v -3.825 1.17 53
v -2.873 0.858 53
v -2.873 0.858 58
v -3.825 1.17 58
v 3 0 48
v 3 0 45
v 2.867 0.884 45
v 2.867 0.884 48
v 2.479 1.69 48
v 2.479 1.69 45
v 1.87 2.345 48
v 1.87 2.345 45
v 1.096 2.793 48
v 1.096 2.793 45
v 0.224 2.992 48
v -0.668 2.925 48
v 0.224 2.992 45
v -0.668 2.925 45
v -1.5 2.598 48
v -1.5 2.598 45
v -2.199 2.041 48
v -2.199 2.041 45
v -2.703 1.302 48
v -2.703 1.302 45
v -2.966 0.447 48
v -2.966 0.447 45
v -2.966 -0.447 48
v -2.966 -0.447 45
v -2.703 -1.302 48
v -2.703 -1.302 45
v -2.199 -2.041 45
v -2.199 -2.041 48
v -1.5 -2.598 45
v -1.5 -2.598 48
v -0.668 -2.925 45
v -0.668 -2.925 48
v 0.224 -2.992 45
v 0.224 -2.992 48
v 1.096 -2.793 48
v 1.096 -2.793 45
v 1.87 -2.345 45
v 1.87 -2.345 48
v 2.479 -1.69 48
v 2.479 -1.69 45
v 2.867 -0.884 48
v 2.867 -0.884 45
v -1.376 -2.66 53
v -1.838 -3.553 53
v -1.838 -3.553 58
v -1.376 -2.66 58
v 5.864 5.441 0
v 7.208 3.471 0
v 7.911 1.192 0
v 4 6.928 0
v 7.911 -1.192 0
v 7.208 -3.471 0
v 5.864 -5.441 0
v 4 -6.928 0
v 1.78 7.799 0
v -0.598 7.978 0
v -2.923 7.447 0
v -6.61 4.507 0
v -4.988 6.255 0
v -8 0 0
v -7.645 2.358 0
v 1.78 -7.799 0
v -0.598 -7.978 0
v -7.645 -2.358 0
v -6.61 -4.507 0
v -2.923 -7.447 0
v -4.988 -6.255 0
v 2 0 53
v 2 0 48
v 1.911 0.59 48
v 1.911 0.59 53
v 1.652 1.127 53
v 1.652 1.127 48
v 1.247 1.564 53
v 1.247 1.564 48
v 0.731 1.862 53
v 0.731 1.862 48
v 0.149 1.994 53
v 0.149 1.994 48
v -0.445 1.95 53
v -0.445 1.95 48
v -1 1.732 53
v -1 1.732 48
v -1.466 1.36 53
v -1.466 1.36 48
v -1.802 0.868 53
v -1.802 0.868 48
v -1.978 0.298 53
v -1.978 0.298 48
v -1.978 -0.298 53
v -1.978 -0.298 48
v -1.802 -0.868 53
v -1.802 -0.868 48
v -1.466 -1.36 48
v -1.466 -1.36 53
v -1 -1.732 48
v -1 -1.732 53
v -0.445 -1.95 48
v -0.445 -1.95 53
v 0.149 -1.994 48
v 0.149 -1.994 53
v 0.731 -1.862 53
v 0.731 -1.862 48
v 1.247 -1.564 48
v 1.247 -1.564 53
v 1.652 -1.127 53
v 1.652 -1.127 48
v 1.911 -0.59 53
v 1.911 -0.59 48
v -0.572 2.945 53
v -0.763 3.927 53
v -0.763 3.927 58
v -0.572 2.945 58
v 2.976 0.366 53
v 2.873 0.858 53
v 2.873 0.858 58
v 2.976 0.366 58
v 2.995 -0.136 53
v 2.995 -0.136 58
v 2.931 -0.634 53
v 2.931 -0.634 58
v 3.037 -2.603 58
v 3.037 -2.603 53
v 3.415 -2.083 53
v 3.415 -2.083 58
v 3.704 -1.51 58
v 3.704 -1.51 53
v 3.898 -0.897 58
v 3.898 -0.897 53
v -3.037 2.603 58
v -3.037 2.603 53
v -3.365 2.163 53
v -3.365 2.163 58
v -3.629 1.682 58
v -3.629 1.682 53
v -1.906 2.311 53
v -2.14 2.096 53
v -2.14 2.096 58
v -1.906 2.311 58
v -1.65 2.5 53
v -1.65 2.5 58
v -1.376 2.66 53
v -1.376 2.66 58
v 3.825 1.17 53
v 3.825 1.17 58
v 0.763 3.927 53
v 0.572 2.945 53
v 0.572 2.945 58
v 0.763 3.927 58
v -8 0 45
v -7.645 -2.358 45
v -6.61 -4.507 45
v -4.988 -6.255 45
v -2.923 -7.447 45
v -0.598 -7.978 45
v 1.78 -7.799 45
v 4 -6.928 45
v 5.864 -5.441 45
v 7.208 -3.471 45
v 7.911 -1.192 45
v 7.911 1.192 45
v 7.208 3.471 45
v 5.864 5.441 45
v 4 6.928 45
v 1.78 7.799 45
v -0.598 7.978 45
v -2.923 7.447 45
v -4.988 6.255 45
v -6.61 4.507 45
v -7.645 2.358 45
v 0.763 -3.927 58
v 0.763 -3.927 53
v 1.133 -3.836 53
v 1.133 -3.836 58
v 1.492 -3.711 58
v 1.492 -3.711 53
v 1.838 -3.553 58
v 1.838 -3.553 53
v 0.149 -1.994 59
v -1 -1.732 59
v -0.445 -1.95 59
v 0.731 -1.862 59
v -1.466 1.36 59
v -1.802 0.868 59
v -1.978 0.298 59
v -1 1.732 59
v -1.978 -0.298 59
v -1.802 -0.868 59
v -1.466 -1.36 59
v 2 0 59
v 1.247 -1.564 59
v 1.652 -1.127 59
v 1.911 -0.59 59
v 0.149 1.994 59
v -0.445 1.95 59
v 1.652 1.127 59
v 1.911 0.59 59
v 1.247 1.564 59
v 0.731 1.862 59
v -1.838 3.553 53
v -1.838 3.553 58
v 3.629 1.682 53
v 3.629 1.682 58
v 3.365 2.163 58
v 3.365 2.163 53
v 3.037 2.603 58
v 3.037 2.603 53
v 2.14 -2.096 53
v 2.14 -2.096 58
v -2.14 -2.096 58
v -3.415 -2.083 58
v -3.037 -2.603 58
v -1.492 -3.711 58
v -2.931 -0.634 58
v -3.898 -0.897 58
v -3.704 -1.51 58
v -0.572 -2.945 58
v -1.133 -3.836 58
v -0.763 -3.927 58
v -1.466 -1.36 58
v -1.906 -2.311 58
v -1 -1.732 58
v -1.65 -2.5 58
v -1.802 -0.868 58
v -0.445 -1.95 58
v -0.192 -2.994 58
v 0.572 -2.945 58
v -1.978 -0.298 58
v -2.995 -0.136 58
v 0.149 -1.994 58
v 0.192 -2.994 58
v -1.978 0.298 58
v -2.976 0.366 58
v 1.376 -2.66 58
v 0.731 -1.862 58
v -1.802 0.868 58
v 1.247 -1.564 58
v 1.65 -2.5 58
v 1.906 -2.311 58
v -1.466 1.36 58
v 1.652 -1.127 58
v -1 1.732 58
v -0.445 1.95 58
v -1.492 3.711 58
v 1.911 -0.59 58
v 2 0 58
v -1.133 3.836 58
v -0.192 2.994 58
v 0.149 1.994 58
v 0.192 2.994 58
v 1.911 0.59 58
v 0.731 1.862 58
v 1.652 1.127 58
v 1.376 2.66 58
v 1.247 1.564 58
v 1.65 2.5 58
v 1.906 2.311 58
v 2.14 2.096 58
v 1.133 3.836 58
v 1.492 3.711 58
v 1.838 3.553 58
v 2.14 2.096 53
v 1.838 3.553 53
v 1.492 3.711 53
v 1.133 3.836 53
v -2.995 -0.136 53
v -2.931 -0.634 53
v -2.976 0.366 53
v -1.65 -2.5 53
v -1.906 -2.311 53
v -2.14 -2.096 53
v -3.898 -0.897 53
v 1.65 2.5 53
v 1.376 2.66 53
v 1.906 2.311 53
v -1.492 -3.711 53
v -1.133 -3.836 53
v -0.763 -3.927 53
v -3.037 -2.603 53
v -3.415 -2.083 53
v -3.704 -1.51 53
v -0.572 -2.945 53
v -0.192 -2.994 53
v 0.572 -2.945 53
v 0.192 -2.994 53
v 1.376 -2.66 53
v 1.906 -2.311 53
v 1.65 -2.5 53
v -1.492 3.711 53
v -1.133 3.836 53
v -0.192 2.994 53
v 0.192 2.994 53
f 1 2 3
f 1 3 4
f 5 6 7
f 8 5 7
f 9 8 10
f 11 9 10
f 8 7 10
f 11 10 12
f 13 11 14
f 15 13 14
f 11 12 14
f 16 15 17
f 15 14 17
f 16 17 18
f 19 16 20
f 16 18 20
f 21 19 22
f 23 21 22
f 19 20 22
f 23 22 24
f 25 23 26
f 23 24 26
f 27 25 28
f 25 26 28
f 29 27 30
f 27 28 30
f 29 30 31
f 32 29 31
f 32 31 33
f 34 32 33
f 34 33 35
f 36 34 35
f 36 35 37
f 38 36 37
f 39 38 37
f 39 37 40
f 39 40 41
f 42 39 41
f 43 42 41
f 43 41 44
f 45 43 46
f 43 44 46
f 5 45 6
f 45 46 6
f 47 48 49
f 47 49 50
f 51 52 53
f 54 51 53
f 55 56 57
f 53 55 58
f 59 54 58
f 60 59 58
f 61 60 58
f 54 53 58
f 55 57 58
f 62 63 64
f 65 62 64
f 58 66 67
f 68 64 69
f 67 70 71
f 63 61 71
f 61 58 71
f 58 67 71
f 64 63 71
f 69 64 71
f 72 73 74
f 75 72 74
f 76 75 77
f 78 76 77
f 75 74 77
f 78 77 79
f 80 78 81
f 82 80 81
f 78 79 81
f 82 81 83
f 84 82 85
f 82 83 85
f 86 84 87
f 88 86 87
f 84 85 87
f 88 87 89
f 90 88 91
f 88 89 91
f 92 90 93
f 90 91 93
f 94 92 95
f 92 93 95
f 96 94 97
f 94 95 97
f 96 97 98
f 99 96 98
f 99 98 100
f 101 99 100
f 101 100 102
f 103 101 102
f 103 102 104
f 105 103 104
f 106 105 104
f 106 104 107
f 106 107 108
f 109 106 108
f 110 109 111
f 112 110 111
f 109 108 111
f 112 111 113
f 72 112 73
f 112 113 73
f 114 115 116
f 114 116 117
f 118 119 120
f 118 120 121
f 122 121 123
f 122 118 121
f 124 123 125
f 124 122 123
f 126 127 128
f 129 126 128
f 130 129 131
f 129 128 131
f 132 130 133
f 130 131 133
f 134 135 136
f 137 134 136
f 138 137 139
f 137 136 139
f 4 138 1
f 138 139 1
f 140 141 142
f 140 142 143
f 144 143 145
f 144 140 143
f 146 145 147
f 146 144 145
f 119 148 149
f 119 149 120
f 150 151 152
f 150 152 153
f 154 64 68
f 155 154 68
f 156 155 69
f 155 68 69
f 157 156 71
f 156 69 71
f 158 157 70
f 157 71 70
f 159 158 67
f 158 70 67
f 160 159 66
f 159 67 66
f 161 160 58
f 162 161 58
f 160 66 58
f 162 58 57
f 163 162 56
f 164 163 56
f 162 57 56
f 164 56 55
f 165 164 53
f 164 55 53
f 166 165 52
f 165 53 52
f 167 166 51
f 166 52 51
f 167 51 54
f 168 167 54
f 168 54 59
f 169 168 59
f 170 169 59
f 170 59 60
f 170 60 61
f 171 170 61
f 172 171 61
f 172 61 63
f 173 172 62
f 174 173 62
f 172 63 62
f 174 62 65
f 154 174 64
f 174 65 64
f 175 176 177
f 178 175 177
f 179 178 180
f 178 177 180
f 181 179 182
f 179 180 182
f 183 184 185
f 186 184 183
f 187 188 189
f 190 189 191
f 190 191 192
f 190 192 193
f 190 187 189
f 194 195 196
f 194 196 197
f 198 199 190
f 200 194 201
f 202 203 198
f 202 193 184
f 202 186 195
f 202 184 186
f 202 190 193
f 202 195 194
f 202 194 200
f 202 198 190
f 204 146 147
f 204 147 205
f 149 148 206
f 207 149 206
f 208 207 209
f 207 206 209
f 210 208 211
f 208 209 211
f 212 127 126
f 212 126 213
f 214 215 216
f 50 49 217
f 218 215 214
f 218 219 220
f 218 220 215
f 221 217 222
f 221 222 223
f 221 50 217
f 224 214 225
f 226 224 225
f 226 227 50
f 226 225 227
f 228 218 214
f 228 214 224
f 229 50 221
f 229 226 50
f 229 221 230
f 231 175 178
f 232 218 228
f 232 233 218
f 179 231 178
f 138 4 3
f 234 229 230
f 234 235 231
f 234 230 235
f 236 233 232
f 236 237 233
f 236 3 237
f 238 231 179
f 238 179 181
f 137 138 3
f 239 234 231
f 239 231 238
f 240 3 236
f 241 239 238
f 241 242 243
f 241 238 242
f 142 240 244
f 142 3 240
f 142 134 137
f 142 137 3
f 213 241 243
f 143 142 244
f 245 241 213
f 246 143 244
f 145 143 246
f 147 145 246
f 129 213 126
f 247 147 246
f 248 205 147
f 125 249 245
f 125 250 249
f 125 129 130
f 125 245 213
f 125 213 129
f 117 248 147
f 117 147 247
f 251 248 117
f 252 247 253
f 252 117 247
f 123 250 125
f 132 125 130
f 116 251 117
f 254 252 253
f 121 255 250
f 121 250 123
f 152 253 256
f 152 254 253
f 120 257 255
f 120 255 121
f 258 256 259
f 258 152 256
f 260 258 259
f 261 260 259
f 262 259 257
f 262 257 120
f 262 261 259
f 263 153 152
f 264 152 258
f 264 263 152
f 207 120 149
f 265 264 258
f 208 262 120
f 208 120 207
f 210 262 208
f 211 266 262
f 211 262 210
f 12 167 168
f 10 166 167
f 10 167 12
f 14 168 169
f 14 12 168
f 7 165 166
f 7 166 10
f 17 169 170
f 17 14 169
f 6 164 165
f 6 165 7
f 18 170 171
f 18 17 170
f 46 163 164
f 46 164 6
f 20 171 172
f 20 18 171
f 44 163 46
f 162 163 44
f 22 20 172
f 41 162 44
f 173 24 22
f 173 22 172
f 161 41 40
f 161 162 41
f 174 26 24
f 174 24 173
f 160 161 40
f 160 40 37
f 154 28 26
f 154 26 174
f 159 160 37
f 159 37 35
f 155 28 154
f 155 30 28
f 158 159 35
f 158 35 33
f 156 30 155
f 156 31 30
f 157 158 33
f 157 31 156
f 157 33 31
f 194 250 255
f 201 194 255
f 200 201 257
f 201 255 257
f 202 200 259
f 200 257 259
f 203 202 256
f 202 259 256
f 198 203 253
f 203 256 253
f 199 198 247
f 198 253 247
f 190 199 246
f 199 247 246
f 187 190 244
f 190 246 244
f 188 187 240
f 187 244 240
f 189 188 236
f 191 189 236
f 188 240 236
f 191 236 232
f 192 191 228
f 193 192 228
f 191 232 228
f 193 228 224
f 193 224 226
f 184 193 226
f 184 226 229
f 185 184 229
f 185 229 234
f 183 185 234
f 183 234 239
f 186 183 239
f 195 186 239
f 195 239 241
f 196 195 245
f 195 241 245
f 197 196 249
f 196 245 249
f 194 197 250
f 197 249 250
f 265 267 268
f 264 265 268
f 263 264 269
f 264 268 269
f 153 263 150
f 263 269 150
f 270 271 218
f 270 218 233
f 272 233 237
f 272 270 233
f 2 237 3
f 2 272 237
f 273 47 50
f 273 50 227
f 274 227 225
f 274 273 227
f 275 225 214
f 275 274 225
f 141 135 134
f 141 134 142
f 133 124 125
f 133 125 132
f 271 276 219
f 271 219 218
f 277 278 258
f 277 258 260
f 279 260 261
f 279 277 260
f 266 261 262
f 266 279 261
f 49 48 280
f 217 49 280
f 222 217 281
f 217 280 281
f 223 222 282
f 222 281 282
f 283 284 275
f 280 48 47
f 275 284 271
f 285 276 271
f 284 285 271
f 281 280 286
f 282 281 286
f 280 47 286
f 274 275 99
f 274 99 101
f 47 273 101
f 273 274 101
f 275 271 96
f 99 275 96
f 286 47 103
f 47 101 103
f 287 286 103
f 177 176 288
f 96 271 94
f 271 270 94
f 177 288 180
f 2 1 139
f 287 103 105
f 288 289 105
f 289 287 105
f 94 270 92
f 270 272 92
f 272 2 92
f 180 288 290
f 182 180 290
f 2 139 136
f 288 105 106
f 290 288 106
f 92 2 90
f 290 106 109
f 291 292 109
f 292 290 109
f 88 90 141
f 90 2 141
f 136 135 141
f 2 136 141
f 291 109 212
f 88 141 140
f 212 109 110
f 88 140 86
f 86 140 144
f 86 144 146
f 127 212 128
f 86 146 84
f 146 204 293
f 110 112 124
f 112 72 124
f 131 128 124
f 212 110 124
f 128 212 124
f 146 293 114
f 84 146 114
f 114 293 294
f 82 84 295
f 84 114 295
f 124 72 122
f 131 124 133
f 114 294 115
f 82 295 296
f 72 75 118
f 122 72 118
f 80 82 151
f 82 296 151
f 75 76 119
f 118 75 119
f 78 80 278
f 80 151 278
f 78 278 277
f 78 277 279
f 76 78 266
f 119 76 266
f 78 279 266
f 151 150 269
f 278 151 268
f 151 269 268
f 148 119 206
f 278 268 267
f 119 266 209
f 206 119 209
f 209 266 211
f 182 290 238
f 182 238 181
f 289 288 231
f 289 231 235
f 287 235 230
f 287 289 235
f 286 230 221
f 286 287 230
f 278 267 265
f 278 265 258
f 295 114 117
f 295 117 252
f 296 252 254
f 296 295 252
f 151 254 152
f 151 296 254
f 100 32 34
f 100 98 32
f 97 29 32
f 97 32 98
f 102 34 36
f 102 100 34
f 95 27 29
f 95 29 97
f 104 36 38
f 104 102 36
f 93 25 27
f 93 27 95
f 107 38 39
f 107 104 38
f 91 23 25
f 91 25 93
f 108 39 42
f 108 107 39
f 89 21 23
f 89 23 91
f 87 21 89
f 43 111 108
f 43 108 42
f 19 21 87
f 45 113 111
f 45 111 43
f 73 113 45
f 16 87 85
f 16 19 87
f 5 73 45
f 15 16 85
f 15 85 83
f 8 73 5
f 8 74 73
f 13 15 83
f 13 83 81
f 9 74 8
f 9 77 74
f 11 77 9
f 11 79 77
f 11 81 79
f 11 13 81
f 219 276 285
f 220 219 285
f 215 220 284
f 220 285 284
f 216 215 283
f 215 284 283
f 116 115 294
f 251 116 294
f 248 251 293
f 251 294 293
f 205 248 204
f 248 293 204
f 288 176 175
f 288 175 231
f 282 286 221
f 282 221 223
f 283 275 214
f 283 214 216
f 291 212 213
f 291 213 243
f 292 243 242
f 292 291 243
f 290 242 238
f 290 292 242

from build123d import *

# Parameters (mm, degrees)
ESBO_O1_R                = 8
RESSALTO_EXTRUS_O1_DEPTH = 45
ESBO_O2_R                = 3
RESSALTO_EXTRUS_O2_DEPTH = 3
ESBO_O3_R                = 2
RESSALTO_EXTRUS_O3_DEPTH = 5
ESBO_O4_R                = 4
RESSALTO_EXTRUS_O4_DEPTH = 5
ESBO_O5_R                = 2
RESSALTO_EXTRUS_O5_DEPTH = 1
CORTE_EXTRUS_O11_START   = -5
CORTE_EXTRUS_O11_DEPTH   = 5


# Read off the part's stored shape, not the designer's step: Corte-extrusão11
with BuildPart() as part:
    # Esboço1 → Ressalto-extrusão1 (new body)
    with BuildSketch(Plane.XY):
        with Locations(Location((0, 0, 0), (0, 0, 180))):
            Circle(ESBO_O1_R)
    extrude(amount=RESSALTO_EXTRUS_O1_DEPTH)

    # Esboço2 → Ressalto-extrusão2 (add)
    with BuildSketch(Plane.XY.offset(45)):
        Circle(ESBO_O2_R)
    extrude(amount=RESSALTO_EXTRUS_O2_DEPTH)

    # Esboço3 → Ressalto-extrusão3 (add)
    with BuildSketch(Plane.XY.offset(48)):
        Circle(ESBO_O3_R)
    extrude(amount=RESSALTO_EXTRUS_O3_DEPTH)

    # Esboço4 → Ressalto-extrusão4 (add)
    with BuildSketch(Plane.XY.offset(53)):
        Circle(ESBO_O4_R)
    extrude(amount=RESSALTO_EXTRUS_O4_DEPTH)

    # Esboço5 → Ressalto-extrusão5 (add)
    with BuildSketch(Plane.XY.offset(58)):
        Circle(ESBO_O5_R)
    extrude(amount=RESSALTO_EXTRUS_O5_DEPTH)

    # Corte-extrusão11 outline → Corte-extrusão11 (cut)
    with BuildSketch(Plane.XY.offset(58).offset(CORTE_EXTRUS_O11_START)):
        with BuildLine():
            ThreePointArc((-0.572247027, 2.944916525), (3.275e-06, 3), (0.572253456, 2.944915276))
            Line((0.572253456, 2.944915276), (0.763004609, 3.926553701))
            ThreePointArc((0.763004609, 3.926553701), (4.366e-06, 4), (-0.762996037, 3.926555367))
            Line((-0.762996037, 3.926555367), (-0.572247027, 2.944916525))
        make_face()
        with BuildLine():
            ThreePointArc((3.037246914, 2.602908216), (2.483346926, 3.135759564), (1.837759325, 3.552835581))
            Line((1.837759325, 3.552835581), (1.376093618, 2.660323526))
            ThreePointArc((1.376093618, 2.660323526), (1.780577016, 2.408422803), (2.139992834, 2.095563308))
            Line((2.139992834, 2.095563308), (3.037246914, 2.602908216))
        make_face()
        with BuildLine():
            Line((-1.376093618, 2.660323526), (-1.837759325, 3.552835581))
            ThreePointArc((-1.837759325, 3.552835581), (-2.483346926, 3.135759564), (-3.037246914, 2.602908216))
            Line((-3.037246914, 2.602908216), (-2.139992834, 2.095563308))
            ThreePointArc((-2.139992834, 2.095563308), (-1.780577016, 2.408422803), (-1.376093618, 2.660323526))
        make_face()
        with BuildLine():
            ThreePointArc((3.898015048, -0.897484644), (3.997519889, 0.140835844), (3.825190717, 1.169579401))
            Line((3.825190717, 1.169579401), (2.873235611, 0.857757981))
            ThreePointArc((2.873235611, 0.857757981), (2.996308475, 0.115616418), (2.93078938, -0.633802208))
            Line((2.93078938, -0.633802208), (3.898015048, -0.897484644))
        make_face()
        with BuildLine():
            Line((-2.873235611, 0.857757981), (-3.825190717, 1.169579401))
            ThreePointArc((-3.825190717, 1.169579401), (-3.997519889, 0.140835844), (-3.898015048, -0.897484644))
            Line((-3.898015048, -0.897484644), (-2.93078938, -0.633802208))
            ThreePointArc((-2.93078938, -0.633802208), (-2.996308475, 0.115616418), (-2.873235611, 0.857757981))
        make_face()
        with BuildLine():
            Line((-2.139992834, -2.095563308), (-3.037246914, -2.602908216))
            ThreePointArc((-3.037246914, -2.602908216), (-2.483346926, -3.135759564), (-1.837759325, -3.552835581))
            Line((-1.837759325, -3.552835581), (-1.376093618, -2.660323526))
            ThreePointArc((-1.376093618, -2.660323526), (-1.780577016, -2.408422803), (-2.139992834, -2.095563308))
        make_face()
        with BuildLine():
            ThreePointArc((1.837759325, -3.552835581), (2.483346926, -3.135759564), (3.037246914, -2.602908216))
            Line((3.037246914, -2.602908216), (2.139992834, -2.095563308))
            ThreePointArc((2.139992834, -2.095563308), (1.780577016, -2.408422803), (1.376093618, -2.660323526))
            Line((1.376093618, -2.660323526), (1.837759325, -3.552835581))
        make_face()
        with BuildLine():
            Line((-0.572247027, -2.944916525), (-0.762996037, -3.926555367))
            ThreePointArc((-0.762996037, -3.926555367), (4.366e-06, -4), (0.763004609, -3.926553701))
            Line((0.763004609, -3.926553701), (0.572253456, -2.944915276))
            ThreePointArc((0.572253456, -2.944915276), (3.275e-06, -3), (-0.572247027, -2.944916525))
        make_face()
    extrude(amount=CORTE_EXTRUS_O11_DEPTH, mode=Mode.SUBTRACT)


solid = part.part
